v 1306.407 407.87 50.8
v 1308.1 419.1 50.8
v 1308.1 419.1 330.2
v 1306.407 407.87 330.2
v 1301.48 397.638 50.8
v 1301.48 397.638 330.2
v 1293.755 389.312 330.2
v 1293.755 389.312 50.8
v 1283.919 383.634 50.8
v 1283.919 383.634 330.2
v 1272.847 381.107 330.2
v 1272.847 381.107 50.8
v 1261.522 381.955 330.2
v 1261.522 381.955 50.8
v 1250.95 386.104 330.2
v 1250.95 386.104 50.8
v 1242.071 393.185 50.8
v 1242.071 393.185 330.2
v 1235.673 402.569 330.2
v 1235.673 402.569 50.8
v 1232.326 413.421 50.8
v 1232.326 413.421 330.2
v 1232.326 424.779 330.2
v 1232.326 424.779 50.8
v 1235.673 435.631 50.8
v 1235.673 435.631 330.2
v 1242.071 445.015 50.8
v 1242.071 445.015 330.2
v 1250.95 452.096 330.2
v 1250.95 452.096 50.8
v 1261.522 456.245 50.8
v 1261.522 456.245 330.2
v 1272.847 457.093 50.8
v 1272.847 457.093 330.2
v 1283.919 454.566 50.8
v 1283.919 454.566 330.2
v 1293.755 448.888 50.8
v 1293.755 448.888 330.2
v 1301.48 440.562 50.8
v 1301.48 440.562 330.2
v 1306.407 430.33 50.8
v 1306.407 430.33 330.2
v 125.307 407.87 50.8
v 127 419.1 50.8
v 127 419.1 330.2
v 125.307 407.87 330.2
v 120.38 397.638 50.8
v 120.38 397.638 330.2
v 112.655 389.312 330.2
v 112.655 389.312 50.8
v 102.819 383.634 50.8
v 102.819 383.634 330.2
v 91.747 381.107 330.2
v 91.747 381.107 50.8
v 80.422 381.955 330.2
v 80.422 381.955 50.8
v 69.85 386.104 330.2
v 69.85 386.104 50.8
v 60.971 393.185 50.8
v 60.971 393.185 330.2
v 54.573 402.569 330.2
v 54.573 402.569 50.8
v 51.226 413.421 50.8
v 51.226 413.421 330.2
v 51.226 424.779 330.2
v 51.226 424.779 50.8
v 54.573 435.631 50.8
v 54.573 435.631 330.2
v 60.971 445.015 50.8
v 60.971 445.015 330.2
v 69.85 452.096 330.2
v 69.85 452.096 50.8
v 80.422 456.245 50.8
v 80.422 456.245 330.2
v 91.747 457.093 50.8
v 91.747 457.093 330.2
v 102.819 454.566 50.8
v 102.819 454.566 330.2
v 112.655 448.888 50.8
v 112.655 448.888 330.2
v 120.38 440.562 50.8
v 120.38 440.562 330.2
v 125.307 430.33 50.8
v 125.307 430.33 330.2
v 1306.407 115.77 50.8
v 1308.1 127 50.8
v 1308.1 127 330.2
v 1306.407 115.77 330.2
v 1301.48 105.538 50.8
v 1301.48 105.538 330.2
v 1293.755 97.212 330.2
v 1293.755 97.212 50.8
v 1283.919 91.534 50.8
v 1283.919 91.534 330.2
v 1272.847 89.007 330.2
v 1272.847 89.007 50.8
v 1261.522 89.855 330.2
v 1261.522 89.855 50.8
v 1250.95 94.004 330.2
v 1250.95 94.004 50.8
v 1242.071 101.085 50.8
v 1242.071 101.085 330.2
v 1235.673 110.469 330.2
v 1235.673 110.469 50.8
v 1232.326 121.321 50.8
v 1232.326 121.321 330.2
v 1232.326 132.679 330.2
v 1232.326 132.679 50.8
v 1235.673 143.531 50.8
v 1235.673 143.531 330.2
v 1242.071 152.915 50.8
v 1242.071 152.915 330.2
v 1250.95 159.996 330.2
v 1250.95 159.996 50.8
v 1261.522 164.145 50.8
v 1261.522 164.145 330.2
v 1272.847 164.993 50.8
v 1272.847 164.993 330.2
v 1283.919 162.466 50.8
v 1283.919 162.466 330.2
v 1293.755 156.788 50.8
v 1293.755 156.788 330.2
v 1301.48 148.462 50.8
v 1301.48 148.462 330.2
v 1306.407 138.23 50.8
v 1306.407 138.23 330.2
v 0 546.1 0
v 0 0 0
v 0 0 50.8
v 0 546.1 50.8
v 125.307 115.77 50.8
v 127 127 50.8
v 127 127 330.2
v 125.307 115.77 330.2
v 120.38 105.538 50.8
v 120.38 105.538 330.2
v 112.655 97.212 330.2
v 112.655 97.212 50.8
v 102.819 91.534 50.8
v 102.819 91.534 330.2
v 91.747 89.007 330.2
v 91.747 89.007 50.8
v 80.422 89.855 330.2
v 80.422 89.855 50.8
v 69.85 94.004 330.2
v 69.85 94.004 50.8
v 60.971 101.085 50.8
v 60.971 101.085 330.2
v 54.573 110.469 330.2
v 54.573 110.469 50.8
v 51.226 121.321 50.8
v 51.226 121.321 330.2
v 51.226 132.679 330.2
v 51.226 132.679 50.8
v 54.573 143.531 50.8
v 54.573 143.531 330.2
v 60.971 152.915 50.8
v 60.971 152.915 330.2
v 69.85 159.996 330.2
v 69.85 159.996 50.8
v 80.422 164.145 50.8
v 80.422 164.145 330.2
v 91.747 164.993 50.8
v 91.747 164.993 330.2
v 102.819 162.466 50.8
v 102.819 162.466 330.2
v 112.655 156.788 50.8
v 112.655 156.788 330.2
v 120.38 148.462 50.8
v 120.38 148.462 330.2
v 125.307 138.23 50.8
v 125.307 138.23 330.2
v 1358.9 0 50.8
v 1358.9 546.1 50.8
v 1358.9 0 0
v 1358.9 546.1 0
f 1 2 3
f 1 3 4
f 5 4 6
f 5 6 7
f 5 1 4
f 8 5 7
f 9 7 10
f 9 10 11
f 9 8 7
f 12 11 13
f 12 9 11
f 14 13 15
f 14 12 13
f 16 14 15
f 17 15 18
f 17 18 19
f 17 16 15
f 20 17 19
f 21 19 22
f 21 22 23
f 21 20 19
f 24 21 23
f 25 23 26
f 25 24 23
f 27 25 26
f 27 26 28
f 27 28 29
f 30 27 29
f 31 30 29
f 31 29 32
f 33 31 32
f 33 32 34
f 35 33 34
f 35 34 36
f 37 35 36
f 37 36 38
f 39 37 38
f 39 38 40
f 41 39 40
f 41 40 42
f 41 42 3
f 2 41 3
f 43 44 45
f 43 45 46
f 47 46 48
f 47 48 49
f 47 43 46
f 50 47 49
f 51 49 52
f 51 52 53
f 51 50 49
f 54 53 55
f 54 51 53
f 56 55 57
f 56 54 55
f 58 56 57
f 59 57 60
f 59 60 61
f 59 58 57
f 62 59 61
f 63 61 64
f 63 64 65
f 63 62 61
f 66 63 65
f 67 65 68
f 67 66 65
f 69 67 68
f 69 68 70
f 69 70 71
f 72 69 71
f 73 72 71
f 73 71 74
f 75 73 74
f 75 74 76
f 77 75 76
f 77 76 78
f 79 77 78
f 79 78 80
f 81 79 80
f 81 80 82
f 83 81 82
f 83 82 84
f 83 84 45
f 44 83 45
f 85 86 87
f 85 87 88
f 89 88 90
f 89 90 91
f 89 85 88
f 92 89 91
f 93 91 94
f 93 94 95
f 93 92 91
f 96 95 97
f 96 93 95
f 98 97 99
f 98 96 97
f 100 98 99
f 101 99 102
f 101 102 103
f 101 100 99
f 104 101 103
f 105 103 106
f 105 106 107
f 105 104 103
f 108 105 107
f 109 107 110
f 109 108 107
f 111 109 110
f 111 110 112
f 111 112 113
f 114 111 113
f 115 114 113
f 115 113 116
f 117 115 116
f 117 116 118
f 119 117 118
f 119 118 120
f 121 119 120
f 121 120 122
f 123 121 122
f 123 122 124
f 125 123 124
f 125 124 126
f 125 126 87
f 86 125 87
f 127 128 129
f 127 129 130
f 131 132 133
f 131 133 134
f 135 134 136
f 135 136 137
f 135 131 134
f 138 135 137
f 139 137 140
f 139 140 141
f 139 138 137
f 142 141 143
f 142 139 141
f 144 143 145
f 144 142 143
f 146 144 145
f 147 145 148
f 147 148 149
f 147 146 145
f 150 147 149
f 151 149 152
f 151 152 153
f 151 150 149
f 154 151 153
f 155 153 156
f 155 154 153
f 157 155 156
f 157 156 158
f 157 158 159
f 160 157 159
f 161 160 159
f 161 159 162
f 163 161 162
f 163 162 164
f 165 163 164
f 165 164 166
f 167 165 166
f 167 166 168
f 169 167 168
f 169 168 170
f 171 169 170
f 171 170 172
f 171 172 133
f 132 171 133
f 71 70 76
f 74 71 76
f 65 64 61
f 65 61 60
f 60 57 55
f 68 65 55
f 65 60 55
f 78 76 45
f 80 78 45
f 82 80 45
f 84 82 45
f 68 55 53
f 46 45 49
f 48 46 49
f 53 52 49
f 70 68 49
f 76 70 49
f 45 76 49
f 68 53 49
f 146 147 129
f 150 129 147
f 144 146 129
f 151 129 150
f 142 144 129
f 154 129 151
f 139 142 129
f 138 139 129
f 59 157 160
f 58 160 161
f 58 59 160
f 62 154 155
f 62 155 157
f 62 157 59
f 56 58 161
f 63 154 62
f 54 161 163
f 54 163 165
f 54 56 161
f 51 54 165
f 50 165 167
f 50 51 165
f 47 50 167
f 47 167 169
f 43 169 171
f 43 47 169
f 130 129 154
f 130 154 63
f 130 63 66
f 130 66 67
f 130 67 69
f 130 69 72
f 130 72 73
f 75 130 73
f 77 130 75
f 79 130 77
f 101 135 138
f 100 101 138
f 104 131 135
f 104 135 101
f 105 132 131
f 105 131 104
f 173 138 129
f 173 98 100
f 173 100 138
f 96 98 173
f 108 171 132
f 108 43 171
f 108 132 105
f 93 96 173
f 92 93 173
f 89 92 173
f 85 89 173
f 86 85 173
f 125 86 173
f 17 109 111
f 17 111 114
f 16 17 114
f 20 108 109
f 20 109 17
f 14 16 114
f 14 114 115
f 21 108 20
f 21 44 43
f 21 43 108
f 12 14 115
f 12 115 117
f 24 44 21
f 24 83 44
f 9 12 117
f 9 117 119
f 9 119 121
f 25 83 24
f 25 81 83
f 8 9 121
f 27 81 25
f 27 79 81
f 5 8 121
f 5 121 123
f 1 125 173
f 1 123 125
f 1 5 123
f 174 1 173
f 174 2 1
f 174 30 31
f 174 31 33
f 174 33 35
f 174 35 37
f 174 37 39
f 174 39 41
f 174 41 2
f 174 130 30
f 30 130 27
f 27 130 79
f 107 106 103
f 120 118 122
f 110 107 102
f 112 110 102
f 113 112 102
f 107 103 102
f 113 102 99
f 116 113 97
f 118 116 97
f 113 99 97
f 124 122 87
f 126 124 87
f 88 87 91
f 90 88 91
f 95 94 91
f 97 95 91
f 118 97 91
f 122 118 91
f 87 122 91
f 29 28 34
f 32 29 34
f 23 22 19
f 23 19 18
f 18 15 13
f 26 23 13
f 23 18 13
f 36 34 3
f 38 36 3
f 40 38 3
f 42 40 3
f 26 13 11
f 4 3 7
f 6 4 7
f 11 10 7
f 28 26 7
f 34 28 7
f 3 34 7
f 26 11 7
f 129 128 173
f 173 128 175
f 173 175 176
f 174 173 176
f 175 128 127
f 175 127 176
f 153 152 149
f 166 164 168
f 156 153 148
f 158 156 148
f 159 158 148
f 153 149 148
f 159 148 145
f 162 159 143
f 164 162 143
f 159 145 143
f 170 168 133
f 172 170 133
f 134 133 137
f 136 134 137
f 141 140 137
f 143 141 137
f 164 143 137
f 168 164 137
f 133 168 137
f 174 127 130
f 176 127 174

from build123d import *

# Parameters (mm, degrees)
F0_W     = 1358.9
F0_H     = 546.1
F1_DEPTH = 50.8
F2_R     = 38.1
F3_DEPTH = 330.2


with BuildPart() as f1:
    # F0 (on Top) → F1 (new body)
    with BuildSketch(Plane.XY):
        with Locations((679.45, 273.05)):
            Rectangle(F0_W, F0_H)
    extrude(amount=F1_DEPTH)

    # F2 (on face) → F3 (join)
    with BuildSketch(Plane(origin=(0, 0, 0), x_dir=(1, 0, 0), z_dir=(0, 0, -1))):
        with Locations((88.9, -127)):
            Circle(F2_R)
        with Locations((1270, -127)):
            Circle(F2_R)
        with Locations((88.9, -419.1)):
            Circle(F2_R)
        with Locations((1270, -419.1)):
            Circle(F2_R)
    extrude(amount=-F3_DEPTH)


solid = f1.part
